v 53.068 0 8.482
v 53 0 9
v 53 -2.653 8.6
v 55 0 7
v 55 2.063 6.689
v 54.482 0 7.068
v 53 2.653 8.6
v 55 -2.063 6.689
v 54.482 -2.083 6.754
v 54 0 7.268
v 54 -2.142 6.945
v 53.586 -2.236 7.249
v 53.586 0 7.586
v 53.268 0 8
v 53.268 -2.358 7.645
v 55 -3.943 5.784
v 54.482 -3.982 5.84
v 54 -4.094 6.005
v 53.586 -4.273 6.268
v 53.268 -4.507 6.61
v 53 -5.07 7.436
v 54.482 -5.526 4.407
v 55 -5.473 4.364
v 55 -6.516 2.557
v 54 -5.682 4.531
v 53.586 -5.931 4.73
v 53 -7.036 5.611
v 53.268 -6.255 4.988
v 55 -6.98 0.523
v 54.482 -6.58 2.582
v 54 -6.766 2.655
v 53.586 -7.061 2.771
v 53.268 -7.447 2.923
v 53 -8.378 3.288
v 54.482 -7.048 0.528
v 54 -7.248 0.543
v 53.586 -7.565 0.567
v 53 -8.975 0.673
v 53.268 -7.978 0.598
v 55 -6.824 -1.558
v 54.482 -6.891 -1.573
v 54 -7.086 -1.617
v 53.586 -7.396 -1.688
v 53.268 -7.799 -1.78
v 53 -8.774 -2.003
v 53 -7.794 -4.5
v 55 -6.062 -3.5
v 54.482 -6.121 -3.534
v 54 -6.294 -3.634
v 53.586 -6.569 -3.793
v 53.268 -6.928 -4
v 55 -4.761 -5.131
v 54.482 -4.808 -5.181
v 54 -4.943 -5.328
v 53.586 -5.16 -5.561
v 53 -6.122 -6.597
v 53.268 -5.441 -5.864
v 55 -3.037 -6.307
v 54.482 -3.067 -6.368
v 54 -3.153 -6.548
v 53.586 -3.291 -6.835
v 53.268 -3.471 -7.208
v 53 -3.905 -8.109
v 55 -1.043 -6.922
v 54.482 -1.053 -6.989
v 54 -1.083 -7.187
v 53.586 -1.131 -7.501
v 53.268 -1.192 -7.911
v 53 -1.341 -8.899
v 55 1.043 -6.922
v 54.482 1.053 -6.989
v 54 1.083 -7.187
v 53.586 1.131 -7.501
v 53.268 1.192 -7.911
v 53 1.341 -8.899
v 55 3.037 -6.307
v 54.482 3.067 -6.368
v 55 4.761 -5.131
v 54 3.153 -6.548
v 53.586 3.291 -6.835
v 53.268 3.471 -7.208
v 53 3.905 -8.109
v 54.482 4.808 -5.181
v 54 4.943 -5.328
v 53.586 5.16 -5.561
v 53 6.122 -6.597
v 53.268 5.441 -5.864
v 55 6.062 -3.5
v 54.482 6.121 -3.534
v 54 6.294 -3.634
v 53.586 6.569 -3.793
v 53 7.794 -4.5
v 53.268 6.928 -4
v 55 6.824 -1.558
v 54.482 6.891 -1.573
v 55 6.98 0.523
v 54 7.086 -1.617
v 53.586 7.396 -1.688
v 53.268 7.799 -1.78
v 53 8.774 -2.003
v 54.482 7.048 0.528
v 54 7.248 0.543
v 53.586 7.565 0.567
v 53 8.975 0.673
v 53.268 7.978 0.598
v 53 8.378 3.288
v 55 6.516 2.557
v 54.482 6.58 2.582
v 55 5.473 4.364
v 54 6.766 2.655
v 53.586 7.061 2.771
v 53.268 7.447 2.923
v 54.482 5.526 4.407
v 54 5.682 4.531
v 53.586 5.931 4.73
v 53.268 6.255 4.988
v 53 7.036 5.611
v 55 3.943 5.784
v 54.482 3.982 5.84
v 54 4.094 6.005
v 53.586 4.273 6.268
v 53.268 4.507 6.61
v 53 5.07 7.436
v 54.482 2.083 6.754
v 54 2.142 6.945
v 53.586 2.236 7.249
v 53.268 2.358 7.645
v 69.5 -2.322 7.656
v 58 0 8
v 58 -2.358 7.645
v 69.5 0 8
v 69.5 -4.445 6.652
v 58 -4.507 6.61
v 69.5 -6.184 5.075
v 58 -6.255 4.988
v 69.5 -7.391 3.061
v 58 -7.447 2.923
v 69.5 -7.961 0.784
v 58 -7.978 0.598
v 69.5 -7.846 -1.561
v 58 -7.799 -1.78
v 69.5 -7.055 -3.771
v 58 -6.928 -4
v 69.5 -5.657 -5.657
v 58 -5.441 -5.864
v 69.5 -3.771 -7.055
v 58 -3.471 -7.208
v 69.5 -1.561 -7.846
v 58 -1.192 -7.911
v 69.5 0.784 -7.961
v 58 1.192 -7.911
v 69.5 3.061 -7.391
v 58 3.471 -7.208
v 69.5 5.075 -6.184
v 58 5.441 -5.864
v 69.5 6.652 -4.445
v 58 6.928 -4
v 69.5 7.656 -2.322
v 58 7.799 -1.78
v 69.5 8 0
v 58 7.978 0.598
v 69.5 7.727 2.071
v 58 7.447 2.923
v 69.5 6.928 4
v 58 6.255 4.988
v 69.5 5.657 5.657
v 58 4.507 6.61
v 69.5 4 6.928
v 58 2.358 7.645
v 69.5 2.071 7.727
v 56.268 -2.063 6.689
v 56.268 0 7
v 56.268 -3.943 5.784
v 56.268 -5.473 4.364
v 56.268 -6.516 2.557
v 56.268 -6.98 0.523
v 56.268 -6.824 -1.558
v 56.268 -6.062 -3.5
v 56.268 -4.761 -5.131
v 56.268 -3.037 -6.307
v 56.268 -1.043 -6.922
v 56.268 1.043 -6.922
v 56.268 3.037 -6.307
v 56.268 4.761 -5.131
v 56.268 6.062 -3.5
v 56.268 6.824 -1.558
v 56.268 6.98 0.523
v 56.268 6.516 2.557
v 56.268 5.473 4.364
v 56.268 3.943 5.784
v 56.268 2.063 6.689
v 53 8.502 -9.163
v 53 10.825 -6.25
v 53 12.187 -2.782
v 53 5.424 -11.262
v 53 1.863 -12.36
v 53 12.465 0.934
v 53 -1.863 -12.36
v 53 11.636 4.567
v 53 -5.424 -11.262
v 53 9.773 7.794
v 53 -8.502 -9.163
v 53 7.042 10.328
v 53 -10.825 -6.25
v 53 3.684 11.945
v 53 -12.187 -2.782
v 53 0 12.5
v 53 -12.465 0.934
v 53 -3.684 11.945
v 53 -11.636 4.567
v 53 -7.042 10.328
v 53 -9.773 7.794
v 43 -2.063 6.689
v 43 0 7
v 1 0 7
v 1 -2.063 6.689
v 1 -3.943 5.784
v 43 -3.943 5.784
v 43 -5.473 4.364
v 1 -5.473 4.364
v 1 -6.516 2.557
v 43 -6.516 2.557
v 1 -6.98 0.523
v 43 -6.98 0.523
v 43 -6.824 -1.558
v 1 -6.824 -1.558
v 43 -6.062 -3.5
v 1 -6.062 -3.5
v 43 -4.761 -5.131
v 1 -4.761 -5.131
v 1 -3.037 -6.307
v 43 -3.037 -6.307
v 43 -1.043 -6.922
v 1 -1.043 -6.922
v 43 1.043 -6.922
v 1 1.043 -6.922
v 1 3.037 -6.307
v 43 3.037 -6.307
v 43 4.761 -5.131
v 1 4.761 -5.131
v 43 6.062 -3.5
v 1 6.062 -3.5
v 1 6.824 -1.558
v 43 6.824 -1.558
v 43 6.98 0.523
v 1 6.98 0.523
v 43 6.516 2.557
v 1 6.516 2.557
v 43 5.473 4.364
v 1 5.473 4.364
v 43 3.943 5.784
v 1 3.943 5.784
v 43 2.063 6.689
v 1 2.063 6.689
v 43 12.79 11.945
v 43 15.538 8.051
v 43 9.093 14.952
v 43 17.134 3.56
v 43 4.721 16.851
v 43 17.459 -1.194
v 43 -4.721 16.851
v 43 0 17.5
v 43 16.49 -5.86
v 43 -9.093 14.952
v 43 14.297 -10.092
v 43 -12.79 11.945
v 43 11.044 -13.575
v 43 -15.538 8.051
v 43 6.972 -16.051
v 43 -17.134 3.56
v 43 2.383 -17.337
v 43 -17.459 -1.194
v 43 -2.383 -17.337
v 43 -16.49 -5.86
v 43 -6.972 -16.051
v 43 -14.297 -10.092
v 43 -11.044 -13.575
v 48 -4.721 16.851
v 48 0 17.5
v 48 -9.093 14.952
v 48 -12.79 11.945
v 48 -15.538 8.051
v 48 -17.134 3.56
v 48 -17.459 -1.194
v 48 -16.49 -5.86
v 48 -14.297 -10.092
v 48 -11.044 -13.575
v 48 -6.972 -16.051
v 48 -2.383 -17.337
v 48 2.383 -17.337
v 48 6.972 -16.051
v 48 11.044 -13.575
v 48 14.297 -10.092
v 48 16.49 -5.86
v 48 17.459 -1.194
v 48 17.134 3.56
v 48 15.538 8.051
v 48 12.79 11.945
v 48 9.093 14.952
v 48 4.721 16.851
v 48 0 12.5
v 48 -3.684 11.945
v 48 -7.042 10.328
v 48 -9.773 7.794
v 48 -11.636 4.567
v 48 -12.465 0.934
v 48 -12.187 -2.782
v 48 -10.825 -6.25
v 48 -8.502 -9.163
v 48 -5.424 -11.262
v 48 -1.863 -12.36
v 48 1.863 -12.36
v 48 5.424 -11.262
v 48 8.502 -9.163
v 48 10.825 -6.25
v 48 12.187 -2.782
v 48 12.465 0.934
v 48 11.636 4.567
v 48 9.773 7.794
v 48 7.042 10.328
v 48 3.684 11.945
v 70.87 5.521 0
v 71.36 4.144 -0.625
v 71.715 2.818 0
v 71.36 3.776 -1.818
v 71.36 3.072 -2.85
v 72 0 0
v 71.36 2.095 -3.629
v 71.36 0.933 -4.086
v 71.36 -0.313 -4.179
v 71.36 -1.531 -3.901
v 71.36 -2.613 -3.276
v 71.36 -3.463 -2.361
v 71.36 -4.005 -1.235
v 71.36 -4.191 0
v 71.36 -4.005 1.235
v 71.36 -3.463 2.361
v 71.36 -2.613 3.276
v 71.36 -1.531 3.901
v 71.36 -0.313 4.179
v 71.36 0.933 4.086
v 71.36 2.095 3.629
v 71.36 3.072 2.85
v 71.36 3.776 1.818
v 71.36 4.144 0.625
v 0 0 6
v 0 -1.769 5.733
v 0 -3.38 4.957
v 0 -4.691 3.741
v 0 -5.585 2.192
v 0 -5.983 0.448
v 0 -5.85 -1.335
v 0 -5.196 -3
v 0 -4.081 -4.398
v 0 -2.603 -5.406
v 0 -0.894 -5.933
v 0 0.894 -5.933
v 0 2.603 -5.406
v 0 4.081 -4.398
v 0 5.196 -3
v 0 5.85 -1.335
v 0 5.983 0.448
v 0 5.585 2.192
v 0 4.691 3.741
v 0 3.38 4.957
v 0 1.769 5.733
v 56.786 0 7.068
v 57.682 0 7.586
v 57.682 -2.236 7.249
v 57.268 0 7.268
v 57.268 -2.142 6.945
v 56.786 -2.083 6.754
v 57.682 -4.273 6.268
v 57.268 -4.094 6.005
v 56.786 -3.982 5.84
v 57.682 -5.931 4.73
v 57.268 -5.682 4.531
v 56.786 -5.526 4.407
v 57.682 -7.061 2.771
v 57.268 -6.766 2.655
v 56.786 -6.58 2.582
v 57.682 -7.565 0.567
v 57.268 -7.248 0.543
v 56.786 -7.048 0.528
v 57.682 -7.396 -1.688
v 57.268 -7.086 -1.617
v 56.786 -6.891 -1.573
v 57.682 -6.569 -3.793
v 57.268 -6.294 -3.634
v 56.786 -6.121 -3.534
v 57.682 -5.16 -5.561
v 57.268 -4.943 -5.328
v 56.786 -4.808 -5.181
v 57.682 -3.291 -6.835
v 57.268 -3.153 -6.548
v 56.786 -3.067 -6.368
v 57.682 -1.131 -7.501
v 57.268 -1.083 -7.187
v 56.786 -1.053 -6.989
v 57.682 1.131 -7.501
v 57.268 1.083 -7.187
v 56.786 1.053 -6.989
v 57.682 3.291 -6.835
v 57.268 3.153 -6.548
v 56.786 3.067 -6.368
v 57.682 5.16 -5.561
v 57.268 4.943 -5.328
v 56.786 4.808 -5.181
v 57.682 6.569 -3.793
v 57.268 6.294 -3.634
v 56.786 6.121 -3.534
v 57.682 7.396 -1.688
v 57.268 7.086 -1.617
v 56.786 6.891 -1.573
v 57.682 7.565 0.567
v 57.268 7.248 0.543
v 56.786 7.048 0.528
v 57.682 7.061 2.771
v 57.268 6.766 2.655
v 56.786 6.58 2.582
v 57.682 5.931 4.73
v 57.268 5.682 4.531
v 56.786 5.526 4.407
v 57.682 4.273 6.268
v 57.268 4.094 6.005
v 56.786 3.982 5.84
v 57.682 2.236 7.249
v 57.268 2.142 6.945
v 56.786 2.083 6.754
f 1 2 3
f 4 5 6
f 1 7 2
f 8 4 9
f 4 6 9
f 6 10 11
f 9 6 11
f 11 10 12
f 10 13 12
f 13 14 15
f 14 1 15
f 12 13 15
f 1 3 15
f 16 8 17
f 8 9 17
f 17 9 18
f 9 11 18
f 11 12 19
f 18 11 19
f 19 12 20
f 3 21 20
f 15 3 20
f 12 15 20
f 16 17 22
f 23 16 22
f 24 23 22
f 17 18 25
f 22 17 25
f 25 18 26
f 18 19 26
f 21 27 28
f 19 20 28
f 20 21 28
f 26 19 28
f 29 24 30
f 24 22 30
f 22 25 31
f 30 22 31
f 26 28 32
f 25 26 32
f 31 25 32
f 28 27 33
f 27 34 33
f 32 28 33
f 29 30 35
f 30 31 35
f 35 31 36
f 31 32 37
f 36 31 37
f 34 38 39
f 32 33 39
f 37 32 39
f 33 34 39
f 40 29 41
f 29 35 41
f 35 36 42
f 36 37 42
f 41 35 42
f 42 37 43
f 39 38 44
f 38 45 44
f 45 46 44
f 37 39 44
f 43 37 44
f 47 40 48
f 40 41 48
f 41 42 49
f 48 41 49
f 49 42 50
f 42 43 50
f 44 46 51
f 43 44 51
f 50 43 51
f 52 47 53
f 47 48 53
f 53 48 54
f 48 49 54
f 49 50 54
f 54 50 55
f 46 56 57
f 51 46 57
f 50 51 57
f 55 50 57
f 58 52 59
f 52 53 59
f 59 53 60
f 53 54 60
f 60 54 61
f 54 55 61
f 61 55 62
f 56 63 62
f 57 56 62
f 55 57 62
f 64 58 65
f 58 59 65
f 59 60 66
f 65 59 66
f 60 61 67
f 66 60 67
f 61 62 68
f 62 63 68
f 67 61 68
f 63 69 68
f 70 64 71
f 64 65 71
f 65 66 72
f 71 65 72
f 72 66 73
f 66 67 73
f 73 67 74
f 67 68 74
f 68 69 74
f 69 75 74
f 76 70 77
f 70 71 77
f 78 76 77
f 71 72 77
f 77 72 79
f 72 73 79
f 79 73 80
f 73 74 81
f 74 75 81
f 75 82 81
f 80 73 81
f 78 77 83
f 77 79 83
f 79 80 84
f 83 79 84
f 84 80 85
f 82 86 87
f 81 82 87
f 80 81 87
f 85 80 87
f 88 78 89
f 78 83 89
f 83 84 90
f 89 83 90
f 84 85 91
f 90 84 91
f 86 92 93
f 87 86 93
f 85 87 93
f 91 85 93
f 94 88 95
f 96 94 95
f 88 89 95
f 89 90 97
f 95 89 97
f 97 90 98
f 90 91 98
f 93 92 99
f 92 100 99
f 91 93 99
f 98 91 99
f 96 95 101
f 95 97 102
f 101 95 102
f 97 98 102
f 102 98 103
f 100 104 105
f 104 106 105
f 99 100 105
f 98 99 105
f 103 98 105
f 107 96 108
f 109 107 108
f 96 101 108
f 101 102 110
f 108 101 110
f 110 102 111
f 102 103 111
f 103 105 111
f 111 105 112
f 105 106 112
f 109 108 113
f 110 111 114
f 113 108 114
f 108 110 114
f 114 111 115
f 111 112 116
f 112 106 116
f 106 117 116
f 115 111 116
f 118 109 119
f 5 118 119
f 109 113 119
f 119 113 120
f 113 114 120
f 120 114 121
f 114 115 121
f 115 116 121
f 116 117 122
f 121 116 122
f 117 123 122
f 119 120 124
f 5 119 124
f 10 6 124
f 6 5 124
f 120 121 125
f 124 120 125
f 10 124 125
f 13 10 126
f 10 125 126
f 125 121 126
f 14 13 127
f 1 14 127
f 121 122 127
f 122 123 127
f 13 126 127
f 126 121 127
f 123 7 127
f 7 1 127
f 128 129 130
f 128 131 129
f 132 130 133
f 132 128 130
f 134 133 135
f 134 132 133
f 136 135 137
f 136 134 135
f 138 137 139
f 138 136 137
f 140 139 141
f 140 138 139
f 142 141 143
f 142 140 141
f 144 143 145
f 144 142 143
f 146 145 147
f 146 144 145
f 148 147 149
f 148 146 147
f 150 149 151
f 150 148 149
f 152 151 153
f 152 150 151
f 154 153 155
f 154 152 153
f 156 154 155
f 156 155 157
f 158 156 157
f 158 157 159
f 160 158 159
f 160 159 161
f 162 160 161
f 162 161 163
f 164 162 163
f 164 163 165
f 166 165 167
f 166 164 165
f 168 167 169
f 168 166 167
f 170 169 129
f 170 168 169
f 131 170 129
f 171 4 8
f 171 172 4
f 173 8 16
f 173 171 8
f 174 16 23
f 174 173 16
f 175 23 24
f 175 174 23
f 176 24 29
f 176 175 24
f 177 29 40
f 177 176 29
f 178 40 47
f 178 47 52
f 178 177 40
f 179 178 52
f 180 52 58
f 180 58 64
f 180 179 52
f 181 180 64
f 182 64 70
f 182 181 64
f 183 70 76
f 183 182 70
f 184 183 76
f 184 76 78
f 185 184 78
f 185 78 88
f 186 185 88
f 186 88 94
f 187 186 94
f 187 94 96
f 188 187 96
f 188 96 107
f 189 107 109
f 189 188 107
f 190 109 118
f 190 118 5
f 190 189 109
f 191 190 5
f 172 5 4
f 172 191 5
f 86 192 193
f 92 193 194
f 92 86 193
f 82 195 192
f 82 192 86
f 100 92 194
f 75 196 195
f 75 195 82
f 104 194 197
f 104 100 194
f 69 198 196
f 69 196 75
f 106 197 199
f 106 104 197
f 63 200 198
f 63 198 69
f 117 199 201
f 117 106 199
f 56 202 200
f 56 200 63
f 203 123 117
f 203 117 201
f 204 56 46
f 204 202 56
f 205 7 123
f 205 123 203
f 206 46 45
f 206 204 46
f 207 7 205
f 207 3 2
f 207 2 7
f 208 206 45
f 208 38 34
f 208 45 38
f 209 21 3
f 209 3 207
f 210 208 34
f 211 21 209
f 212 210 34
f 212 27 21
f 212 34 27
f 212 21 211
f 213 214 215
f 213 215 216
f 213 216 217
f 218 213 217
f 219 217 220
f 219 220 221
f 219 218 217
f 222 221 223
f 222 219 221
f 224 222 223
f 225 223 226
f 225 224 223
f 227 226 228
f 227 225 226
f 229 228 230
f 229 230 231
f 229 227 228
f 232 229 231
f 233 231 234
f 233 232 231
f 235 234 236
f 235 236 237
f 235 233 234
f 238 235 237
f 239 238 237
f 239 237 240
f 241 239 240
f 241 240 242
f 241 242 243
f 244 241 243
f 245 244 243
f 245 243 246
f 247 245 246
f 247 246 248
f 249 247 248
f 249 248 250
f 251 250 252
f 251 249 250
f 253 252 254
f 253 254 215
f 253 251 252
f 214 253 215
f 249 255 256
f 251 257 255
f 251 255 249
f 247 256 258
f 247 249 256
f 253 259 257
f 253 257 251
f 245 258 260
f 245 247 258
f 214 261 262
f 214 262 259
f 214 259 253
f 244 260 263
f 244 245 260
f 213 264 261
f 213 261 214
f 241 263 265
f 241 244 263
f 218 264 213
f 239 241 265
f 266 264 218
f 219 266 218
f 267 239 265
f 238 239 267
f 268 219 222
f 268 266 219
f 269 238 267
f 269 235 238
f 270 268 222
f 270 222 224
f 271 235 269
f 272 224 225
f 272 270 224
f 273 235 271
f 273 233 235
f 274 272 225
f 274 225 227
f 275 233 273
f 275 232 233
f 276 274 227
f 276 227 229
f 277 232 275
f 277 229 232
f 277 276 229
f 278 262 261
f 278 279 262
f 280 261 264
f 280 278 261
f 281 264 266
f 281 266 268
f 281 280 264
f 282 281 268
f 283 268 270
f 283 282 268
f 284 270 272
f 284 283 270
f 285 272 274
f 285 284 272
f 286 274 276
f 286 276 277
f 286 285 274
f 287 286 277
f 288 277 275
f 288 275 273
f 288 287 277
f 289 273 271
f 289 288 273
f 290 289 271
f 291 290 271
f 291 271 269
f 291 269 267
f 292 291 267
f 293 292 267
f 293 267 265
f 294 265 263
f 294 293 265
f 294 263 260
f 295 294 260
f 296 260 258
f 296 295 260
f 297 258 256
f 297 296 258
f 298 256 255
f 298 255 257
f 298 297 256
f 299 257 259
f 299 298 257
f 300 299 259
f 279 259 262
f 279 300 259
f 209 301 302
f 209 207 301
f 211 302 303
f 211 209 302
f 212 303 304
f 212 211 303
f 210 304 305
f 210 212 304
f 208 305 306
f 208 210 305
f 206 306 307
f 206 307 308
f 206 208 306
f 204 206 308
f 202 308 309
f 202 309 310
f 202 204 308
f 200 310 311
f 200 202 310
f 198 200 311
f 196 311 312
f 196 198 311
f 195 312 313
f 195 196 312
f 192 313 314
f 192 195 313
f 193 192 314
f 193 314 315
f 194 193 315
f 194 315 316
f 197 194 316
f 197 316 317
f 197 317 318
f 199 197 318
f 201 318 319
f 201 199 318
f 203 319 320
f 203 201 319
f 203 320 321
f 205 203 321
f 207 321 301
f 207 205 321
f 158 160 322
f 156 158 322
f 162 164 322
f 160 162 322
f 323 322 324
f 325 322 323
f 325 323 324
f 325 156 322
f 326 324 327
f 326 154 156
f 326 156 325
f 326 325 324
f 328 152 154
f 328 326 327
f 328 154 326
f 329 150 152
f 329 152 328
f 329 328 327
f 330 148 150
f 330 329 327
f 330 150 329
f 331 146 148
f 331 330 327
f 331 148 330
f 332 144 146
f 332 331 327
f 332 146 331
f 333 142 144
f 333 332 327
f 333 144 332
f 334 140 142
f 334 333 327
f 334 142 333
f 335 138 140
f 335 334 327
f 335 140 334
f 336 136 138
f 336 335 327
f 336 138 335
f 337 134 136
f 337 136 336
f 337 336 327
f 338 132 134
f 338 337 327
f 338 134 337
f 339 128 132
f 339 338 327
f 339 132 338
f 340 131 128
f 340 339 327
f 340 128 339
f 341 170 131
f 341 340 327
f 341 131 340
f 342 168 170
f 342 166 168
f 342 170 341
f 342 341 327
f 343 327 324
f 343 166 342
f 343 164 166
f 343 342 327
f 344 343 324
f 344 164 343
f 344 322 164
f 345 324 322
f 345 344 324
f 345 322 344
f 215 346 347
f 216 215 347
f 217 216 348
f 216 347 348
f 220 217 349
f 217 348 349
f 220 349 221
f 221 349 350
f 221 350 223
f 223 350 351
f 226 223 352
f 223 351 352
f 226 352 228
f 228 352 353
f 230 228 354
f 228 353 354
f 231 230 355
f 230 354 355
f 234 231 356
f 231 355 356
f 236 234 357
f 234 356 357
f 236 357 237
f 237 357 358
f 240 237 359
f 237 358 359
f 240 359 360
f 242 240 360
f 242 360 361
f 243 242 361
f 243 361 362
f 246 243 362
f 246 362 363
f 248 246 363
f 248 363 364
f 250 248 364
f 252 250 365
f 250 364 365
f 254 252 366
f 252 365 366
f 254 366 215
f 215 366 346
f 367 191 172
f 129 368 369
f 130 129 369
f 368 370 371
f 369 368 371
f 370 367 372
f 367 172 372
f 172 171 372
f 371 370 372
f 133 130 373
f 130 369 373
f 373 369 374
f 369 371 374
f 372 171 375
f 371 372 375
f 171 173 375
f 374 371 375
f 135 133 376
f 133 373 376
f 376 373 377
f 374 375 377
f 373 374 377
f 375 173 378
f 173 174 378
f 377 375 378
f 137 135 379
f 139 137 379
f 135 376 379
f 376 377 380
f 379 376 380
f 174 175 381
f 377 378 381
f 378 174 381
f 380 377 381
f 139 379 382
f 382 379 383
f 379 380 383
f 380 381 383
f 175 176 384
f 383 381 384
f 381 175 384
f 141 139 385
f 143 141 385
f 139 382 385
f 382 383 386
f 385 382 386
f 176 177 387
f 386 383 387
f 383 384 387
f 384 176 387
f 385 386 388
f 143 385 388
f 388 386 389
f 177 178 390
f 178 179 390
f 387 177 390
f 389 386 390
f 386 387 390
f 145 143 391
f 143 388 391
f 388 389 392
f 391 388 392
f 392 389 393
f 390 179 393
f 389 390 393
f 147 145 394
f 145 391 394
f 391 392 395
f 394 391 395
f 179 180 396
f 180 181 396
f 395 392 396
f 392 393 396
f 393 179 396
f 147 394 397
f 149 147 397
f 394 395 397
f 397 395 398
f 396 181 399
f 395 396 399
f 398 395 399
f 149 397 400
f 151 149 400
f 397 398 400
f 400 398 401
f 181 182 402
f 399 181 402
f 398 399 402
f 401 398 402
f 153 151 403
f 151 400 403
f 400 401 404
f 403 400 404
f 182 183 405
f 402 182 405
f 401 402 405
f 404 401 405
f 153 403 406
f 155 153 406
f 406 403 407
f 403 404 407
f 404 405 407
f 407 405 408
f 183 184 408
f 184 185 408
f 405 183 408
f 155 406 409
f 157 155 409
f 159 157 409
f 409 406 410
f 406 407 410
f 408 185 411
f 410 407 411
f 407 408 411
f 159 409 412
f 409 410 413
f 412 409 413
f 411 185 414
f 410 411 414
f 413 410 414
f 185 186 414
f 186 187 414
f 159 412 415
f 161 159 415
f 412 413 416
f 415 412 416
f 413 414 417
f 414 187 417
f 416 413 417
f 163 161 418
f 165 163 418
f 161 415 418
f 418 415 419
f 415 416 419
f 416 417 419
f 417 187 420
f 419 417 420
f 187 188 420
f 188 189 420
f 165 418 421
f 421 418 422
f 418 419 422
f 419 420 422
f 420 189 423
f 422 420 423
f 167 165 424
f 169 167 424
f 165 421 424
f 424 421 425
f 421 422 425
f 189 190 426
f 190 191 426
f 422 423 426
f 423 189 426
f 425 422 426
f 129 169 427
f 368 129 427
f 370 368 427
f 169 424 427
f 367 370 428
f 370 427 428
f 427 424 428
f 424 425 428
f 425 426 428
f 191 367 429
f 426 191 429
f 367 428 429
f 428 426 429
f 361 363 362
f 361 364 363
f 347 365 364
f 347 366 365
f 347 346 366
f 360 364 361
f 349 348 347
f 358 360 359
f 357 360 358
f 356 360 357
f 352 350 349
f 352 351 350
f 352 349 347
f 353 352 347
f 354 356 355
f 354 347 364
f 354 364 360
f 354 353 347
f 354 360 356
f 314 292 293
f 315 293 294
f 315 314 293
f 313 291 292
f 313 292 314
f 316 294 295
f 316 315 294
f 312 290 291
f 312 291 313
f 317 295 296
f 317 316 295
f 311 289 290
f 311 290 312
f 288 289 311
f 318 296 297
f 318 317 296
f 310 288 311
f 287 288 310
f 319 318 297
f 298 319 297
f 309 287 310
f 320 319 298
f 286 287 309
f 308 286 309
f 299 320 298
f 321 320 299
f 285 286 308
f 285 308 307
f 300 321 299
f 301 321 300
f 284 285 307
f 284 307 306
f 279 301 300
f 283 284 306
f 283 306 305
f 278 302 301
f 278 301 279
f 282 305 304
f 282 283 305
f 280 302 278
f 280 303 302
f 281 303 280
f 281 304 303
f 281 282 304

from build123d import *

# Parameters (mm, degrees)
RADYUS2_R = 2
PAH1_SIZE = 1
IZIM2_W   = 0.487804803
IZIM2_H   = 8


with BuildPart() as part:
    # Çizim1 → Döndür1 (revolve)
    with BuildSketch(Plane.XY, mode=Mode.PRIVATE) as d_nd_r1_sk:
        Polygon((0, 0), (0, 7), (43, 7), (43, 17.5), (48, 17.5), (48, 12.5), (53, 12.5), (53, 7), (58, 7), (58, 8), (72, 8), (72, 0), align=None)
    revolve(d_nd_r1_sk.sketch.rotate(Axis((0, 0, 0), (1, 0, 0)), 90), axis=Axis((0, 0, 0), (1, 0, 0)))

    # Radyus2
    # the kernel refuses this fillet: 2 mm, written as the material it adds along each edge
    with BuildSketch(Plane(origin=(58, 0, 0), x_dir=(0, 0, 1), z_dir=(0, 1, 0))) as radyus2_piece_1:
        with BuildLine():
            CenterArc((9, -1.732050808), RADYUS2_R, 120, 60)
            Line((8, 0), (7.98, 0.034641016))
            ThreePointArc((7.98, 0.034641016), (7.5, 0.04), (7, 0.04))
            Line((7, 0.04), (6.96, 0))
            Line((6.96, 0), (6.96, -1.732050808))
            Line((6.96, -1.732050808), (7, -1.732050808))
        make_face()
    revolve(axis=Axis((58, 0, 0), (1, 0, 0)))
    with BuildSketch(Plane(origin=(53, 0, 0), x_dir=(0, 0, 1), z_dir=(0, 1, 0))) as radyus2_piece_2:
        with BuildLine():
            CenterArc((7 + RADYUS2_R, RADYUS2_R), RADYUS2_R, 180, 90)
            Line((7, RADYUS2_R), (7 - RADYUS2_R * 0.02, RADYUS2_R))
            Line((7 - RADYUS2_R * 0.02, RADYUS2_R), (7 - RADYUS2_R * 0.02, -RADYUS2_R * 0.02))
            Line((7 - RADYUS2_R * 0.02, -RADYUS2_R * 0.02), (7 + RADYUS2_R, -RADYUS2_R * 0.02))
            Line((7 + RADYUS2_R, -RADYUS2_R * 0.02), (7 + RADYUS2_R, 0))
        make_face()
    revolve(axis=Axis((53, 0, 0), (1, 0, 0)))

    # Pah1
    pah1_edges = [part.edges().sort_by_distance(p)[0] for p in [
        (0, 0, -7),
    ]]
    chamfer(pah1_edges, length=PAH1_SIZE)

    # Çizim2 → Kes-Döndür1 (revolve, cut)
    with BuildSketch(Plane.XY):
        with BuildLine():
            Line((69.5, 8), (72, 8))
            Line((72, 8), (72, 0))
            ThreePointArc((72, 0), (71.360443691, 4.190763654), (69.5, 8))
        make_face()
        with Locations((72.243902402, 4)):
            Rectangle(IZIM2_W, IZIM2_H)
    revolve(axis=Axis((72, 0, 0), (-1, 0, 0)), mode=Mode.SUBTRACT)


solid = part.part
